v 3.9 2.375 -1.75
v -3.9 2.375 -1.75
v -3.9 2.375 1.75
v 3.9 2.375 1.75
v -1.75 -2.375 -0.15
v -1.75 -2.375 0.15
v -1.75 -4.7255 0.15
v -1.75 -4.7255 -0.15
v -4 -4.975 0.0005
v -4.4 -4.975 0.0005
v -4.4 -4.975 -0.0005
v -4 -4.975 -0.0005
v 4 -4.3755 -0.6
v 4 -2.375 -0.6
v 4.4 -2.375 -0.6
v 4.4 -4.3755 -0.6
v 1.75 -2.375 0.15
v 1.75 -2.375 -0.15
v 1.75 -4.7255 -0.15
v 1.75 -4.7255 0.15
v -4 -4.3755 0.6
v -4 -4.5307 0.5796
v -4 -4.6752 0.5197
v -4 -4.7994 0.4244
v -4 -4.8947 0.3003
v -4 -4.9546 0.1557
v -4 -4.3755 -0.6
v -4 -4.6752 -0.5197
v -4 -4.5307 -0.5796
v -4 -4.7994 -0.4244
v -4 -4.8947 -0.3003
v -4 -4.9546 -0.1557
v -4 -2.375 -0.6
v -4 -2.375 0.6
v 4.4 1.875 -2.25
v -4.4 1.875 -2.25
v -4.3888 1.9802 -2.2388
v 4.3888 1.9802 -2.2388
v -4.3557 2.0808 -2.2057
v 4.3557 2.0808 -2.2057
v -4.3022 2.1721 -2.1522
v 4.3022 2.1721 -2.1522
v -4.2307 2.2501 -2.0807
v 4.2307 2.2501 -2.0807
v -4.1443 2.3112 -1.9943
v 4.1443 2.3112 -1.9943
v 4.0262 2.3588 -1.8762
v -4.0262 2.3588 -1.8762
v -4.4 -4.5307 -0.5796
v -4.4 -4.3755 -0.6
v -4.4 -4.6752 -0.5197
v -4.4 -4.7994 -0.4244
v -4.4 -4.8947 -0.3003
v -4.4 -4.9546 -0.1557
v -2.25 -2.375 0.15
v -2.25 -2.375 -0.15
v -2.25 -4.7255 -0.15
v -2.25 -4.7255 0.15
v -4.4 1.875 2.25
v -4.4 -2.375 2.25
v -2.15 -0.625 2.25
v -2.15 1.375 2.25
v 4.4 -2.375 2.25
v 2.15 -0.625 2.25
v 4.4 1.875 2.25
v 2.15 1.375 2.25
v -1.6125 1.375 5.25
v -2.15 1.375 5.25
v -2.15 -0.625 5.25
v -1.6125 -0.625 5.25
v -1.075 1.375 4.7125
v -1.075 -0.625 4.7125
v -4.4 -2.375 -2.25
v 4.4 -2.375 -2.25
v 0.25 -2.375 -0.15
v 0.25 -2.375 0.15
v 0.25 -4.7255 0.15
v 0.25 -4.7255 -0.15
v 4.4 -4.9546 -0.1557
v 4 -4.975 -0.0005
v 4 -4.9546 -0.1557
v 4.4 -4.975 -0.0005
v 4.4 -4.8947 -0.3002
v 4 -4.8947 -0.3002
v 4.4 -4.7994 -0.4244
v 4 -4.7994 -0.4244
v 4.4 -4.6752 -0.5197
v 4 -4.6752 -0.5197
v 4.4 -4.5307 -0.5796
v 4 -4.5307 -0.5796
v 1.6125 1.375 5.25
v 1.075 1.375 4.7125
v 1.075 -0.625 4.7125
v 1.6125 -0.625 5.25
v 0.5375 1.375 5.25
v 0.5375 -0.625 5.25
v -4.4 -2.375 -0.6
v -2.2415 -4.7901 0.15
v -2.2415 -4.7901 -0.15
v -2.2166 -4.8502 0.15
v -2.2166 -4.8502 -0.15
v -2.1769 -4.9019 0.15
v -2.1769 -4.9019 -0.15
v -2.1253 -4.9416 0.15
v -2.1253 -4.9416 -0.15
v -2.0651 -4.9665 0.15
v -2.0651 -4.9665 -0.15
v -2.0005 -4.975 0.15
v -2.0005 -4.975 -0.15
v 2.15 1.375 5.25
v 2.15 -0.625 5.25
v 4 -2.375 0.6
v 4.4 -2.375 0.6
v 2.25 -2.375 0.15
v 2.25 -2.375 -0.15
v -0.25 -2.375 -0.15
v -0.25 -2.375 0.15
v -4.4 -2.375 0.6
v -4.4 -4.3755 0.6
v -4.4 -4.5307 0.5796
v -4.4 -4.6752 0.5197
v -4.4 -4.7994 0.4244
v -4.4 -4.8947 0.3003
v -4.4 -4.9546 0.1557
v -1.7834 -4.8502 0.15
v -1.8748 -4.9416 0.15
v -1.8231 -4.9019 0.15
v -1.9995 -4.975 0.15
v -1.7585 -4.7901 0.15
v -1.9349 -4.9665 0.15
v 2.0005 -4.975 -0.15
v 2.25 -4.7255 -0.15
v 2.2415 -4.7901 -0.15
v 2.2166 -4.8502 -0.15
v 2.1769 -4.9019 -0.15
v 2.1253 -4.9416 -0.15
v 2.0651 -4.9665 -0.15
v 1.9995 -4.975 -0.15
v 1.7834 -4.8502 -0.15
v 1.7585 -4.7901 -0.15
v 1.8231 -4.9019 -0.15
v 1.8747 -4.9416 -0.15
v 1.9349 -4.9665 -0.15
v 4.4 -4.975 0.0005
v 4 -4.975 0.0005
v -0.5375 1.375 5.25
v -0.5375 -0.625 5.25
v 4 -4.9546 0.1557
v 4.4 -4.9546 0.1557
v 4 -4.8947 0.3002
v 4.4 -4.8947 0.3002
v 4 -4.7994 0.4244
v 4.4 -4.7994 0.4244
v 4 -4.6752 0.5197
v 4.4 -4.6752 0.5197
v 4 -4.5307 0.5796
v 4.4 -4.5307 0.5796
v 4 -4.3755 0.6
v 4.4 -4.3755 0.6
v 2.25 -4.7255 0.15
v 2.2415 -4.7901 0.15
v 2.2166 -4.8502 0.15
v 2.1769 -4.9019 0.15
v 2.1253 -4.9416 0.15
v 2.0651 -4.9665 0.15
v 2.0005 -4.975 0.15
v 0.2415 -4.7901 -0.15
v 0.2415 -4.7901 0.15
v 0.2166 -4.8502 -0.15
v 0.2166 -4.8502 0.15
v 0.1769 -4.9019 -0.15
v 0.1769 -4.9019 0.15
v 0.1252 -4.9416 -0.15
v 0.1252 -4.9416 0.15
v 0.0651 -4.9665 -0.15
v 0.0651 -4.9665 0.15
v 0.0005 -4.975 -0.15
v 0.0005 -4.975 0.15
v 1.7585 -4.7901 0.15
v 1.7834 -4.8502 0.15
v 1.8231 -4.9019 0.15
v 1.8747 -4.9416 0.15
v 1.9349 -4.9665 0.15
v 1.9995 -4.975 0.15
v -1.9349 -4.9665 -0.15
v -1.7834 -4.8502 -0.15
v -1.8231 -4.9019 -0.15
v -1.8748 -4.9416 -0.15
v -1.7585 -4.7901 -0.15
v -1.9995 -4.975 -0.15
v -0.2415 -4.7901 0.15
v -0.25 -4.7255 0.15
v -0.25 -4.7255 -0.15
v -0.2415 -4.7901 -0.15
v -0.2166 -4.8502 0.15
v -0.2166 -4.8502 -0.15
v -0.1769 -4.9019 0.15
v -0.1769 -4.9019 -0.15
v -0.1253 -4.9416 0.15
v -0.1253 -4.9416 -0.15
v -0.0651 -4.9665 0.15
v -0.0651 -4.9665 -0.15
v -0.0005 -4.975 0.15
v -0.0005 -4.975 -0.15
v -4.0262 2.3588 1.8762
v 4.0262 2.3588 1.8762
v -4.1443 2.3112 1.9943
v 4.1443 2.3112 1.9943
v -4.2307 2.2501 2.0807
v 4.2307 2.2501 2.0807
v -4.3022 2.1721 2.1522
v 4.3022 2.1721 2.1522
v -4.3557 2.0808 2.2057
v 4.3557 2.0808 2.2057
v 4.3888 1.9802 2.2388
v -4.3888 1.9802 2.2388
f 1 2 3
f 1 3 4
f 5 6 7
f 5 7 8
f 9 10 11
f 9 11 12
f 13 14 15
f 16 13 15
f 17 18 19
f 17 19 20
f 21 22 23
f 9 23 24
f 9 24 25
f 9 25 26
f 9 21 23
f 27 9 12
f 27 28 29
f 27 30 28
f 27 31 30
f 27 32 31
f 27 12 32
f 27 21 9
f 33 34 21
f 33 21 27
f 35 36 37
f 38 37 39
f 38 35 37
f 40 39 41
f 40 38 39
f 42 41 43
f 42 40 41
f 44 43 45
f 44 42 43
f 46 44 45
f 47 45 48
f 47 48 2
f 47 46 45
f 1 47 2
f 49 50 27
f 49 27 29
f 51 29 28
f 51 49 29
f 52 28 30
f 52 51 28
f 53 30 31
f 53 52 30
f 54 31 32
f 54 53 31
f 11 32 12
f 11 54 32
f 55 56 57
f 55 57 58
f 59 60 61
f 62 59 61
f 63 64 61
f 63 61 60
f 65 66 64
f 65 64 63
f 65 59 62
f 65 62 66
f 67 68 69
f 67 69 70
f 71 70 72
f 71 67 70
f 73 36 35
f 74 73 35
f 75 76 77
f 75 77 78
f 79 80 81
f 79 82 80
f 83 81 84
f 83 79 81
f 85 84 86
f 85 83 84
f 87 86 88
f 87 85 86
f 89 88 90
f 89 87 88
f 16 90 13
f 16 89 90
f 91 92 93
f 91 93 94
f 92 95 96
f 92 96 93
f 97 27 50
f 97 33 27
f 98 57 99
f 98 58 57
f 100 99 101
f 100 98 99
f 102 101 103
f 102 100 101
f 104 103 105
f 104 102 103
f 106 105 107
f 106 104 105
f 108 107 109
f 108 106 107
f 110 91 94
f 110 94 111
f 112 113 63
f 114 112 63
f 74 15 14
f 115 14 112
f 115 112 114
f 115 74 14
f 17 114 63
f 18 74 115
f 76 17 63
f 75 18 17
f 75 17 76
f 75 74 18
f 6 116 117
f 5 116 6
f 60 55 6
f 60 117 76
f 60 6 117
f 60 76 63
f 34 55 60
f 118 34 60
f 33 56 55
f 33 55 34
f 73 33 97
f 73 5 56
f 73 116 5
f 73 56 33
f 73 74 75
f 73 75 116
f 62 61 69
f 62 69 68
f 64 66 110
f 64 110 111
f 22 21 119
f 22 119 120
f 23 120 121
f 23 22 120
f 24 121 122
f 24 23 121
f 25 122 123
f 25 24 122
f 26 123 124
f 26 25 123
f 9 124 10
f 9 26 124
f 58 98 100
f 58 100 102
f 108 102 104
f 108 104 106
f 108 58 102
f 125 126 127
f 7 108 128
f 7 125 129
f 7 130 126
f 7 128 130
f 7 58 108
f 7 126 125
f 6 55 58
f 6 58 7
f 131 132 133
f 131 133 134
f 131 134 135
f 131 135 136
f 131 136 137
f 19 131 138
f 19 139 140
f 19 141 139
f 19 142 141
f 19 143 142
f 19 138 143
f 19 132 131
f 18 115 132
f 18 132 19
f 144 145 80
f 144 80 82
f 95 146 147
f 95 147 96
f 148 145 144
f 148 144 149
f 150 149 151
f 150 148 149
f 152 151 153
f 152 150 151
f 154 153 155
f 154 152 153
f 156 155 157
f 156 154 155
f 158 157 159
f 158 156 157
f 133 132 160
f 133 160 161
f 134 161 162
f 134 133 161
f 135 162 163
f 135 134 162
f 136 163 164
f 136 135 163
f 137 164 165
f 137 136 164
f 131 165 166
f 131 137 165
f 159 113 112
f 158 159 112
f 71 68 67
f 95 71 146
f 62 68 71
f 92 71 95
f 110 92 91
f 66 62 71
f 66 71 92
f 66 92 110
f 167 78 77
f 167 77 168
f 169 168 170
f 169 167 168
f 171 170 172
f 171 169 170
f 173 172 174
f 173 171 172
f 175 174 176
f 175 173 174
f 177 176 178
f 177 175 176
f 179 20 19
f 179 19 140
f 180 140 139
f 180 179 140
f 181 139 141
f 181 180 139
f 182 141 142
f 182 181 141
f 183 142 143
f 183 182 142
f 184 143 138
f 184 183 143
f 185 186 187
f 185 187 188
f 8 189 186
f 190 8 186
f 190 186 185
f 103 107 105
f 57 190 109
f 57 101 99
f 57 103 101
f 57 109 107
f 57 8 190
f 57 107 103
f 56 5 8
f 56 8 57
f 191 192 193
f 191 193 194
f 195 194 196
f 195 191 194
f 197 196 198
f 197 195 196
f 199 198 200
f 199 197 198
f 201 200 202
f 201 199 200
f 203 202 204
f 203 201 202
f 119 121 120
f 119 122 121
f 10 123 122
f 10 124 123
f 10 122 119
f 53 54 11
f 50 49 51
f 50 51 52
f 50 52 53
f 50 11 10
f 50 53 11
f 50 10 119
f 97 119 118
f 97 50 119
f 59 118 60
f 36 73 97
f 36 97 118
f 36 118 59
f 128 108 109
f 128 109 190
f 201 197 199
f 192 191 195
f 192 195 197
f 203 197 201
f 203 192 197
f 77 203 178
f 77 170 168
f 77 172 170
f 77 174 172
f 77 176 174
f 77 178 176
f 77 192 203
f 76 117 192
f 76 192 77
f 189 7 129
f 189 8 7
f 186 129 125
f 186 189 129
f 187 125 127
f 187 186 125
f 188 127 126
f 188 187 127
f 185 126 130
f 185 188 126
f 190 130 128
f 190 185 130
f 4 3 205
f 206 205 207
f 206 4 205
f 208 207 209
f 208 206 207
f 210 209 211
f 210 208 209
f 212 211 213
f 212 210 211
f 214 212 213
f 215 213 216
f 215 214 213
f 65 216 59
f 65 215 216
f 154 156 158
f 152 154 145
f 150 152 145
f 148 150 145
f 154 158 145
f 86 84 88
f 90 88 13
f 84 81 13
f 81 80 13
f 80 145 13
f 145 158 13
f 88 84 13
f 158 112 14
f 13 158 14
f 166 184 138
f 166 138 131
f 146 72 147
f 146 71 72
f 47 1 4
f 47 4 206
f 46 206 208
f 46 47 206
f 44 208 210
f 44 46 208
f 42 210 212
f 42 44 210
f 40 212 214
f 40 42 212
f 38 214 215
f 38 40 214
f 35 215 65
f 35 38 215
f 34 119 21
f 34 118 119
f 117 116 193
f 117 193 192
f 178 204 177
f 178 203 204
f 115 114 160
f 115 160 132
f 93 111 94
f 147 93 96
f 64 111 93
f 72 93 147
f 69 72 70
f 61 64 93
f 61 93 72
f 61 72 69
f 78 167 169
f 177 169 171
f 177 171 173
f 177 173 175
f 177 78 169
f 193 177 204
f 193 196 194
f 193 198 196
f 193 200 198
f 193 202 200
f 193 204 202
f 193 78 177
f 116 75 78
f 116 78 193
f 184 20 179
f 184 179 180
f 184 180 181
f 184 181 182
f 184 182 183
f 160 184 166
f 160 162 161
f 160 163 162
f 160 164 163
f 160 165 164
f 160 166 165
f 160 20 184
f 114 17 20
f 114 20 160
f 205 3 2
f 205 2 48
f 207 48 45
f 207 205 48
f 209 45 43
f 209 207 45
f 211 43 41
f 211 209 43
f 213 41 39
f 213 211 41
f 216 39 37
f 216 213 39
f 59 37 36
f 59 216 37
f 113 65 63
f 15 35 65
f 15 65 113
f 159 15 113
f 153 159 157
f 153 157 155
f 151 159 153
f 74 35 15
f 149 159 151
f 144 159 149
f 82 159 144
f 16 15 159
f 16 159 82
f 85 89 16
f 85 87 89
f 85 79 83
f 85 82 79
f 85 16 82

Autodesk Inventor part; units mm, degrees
ref_plane "YZ Plane" through (0, 0, 0) normal (1, 0, 0) x (0, 1, 0)
ref_plane "XY Plane" through (0, 0, 0) normal (0, 0, 1) x (1, 0, 0)
sketch "Sketch1" plane through (0, 0, 0) normal (0, 0, 1) x (1, 0, 0)
  line L0 (-4.4, 2.375) -> (4.4, 2.375)
  line L1 (4.4, 2.375) -> (4.4, -2.375)
  line L2 (4.4, -2.375) -> (-4.4, -2.375)
  line L3 (-4.4, -2.375) -> (-4.4, 2.375)
  line L4 (-6.16, 0) -> (6.16, 0) construction
  line L5 (0, -3.325) -> (0, 3.325) construction
  point P0 (0, 0)
  dimension "d0" = 8.8
  dimension "d1" = 4.75
extrude "Extrusion1" add sketch "Sketch1" along normal mid plane 4.5
sketch "Sketch2" plane through (0, 0, 2.25) normal (0, 0, 1) x (1, 0, 0)
  line L0 (-2.15, 1.375) -> (2.15, 1.375)
  line L1 (2.15, 1.375) -> (2.15, -0.625)
  line L2 (2.15, -0.625) -> (-2.15, -0.625)
  line L3 (-2.15, -0.625) -> (-2.15, 1.375)
  line L4 (0, -3.325) -> (0, 3.325) construction
  line L5 (-6.16, 0) -> (6.16, 0) construction
  line L6 (4.4, 2.375) -> (-4.4, 2.375) projected
  point P0 (0, 0)
  dimension "d4" = 4.3
  dimension "d5" = 2
  dimension "d30" = 1
extrude "Extrusion2" add sketch "Sketch2" along normal blind 3
ref_plane "Work Plane1" through (0, -0.625, 2.25) normal (1, 0, 0) x (0, 0, -1)
split_face "Split1"
sketch "Sketch6" plane through (-2.15, 1.375, 2.25) normal (0, 1, 0) x (1, 0, 0)
  line L0 (2.15, -3) -> (0, -3) projected
  line L1 (0.5375, -3) -> (1.075, -2.4625)
  line L2 (1.075, -2.4625) -> (1.6125, -3)
  line L3 (0, -3) -> (2.15, -3) projected
  point P0 (2.15, 2.25)
  point P1 (1.075, -3)
  point P2 (1.075, -3)
  dimension "d24" = 2.15
  dimension "d25" = 0.5375
  dimension "d26" = 45
extrude "Extrusion4" cut sketch "Sketch6" against normal up to surface (2 mm away)
mirror "Mirror1" about plane through (0, -0.625, 2.25) normal (1, 0, 0) of "Extrusion4"
sketch "Sketch3" plane through (-4.4, -2.375, 2.25) normal (0, -1, 0) x (1, 0, 0)
  line L0 (0, -4.5) -> (0, 0) construction
  line L1 (0, -1.65) -> (0.4, -1.65)
  line L2 (0.4, -1.65) -> (0.4, -2.85)
  line L3 (0.4, -2.85) -> (0, -2.85)
  line L4 (0, -2.85) -> (0, -1.65)
  line L5 (8.8, -4.5) -> (8.8, 0) construction
  line L6 (8.8, -1.65) -> (8.4, -1.65)
  line L7 (8.4, -1.65) -> (8.4, -2.85)
  line L8 (8.4, -2.85) -> (8.8, -2.85)
  line L9 (8.8, -2.85) -> (8.8, -1.65)
  line L10 (4.15, -2.1) -> (4.65, -2.1)
  line L11 (4.65, -2.1) -> (4.65, -2.4)
  line L12 (4.65, -2.4) -> (4.15, -2.4)
  line L13 (4.15, -2.4) -> (4.15, -2.1)
  line L14 (2.15, -2.1) -> (2.65, -2.1)
  line L15 (2.65, -2.1) -> (2.65, -2.4)
  line L16 (2.65, -2.4) -> (2.15, -2.4)
  line L17 (2.15, -2.4) -> (2.15, -2.1)
  line L18 (6.15, -2.1) -> (6.65, -2.1)
  line L19 (6.65, -2.1) -> (6.65, -2.4)
  line L20 (6.65, -2.4) -> (6.15, -2.4)
  line L21 (6.15, -2.4) -> (6.15, -2.1)
  line L22 (-1.76, -2.25) -> (10.56, -2.25) construction
  line L23 (4.4, -6) -> (4.4, 4.5) construction
  point P0 (4.4, -2.25)
  dimension "d8" = 0.4
  dimension "d9" = 1.2
  dimension "d10" = 0.4
  dimension "d11" = 0.5
  dimension "d12" = 0.3
  dimension "d13" = 0.5
  dimension "d14" = 0.3
  dimension "d15" = 0.5
  dimension "d16" = 0.3
  dimension "d17" = 1.5
extrude "Extrusion3" add sketch "Sketch3" along normal blind 2.6
fillet "Fillet1" radius 0.6 4 edges at (4.2, -4.975, 0.6) (4.2, -4.975, -0.6) (-4.2, -4.975, -0.6) (-4.2, -4.975, 0.6)
fillet "Fillet2" radius 0.25 6 edges at (2.25, -4.975, 0) (1.75, -4.975, 0) (0.25, -4.975, 0) (-0.25, -4.975, 0) (-1.75, -4.975, 0) (-2.25, -4.975, 0)
fillet "Fillet3" radius 0.5 4 edges at (4.4, 2.375, 0) (-4.4, 2.375, 0) (0, 2.375, 2.25) (0, 2.375, -2.25)
equation "\"d25\" = 0.25 * d24"
properties part number "Power_switch"
